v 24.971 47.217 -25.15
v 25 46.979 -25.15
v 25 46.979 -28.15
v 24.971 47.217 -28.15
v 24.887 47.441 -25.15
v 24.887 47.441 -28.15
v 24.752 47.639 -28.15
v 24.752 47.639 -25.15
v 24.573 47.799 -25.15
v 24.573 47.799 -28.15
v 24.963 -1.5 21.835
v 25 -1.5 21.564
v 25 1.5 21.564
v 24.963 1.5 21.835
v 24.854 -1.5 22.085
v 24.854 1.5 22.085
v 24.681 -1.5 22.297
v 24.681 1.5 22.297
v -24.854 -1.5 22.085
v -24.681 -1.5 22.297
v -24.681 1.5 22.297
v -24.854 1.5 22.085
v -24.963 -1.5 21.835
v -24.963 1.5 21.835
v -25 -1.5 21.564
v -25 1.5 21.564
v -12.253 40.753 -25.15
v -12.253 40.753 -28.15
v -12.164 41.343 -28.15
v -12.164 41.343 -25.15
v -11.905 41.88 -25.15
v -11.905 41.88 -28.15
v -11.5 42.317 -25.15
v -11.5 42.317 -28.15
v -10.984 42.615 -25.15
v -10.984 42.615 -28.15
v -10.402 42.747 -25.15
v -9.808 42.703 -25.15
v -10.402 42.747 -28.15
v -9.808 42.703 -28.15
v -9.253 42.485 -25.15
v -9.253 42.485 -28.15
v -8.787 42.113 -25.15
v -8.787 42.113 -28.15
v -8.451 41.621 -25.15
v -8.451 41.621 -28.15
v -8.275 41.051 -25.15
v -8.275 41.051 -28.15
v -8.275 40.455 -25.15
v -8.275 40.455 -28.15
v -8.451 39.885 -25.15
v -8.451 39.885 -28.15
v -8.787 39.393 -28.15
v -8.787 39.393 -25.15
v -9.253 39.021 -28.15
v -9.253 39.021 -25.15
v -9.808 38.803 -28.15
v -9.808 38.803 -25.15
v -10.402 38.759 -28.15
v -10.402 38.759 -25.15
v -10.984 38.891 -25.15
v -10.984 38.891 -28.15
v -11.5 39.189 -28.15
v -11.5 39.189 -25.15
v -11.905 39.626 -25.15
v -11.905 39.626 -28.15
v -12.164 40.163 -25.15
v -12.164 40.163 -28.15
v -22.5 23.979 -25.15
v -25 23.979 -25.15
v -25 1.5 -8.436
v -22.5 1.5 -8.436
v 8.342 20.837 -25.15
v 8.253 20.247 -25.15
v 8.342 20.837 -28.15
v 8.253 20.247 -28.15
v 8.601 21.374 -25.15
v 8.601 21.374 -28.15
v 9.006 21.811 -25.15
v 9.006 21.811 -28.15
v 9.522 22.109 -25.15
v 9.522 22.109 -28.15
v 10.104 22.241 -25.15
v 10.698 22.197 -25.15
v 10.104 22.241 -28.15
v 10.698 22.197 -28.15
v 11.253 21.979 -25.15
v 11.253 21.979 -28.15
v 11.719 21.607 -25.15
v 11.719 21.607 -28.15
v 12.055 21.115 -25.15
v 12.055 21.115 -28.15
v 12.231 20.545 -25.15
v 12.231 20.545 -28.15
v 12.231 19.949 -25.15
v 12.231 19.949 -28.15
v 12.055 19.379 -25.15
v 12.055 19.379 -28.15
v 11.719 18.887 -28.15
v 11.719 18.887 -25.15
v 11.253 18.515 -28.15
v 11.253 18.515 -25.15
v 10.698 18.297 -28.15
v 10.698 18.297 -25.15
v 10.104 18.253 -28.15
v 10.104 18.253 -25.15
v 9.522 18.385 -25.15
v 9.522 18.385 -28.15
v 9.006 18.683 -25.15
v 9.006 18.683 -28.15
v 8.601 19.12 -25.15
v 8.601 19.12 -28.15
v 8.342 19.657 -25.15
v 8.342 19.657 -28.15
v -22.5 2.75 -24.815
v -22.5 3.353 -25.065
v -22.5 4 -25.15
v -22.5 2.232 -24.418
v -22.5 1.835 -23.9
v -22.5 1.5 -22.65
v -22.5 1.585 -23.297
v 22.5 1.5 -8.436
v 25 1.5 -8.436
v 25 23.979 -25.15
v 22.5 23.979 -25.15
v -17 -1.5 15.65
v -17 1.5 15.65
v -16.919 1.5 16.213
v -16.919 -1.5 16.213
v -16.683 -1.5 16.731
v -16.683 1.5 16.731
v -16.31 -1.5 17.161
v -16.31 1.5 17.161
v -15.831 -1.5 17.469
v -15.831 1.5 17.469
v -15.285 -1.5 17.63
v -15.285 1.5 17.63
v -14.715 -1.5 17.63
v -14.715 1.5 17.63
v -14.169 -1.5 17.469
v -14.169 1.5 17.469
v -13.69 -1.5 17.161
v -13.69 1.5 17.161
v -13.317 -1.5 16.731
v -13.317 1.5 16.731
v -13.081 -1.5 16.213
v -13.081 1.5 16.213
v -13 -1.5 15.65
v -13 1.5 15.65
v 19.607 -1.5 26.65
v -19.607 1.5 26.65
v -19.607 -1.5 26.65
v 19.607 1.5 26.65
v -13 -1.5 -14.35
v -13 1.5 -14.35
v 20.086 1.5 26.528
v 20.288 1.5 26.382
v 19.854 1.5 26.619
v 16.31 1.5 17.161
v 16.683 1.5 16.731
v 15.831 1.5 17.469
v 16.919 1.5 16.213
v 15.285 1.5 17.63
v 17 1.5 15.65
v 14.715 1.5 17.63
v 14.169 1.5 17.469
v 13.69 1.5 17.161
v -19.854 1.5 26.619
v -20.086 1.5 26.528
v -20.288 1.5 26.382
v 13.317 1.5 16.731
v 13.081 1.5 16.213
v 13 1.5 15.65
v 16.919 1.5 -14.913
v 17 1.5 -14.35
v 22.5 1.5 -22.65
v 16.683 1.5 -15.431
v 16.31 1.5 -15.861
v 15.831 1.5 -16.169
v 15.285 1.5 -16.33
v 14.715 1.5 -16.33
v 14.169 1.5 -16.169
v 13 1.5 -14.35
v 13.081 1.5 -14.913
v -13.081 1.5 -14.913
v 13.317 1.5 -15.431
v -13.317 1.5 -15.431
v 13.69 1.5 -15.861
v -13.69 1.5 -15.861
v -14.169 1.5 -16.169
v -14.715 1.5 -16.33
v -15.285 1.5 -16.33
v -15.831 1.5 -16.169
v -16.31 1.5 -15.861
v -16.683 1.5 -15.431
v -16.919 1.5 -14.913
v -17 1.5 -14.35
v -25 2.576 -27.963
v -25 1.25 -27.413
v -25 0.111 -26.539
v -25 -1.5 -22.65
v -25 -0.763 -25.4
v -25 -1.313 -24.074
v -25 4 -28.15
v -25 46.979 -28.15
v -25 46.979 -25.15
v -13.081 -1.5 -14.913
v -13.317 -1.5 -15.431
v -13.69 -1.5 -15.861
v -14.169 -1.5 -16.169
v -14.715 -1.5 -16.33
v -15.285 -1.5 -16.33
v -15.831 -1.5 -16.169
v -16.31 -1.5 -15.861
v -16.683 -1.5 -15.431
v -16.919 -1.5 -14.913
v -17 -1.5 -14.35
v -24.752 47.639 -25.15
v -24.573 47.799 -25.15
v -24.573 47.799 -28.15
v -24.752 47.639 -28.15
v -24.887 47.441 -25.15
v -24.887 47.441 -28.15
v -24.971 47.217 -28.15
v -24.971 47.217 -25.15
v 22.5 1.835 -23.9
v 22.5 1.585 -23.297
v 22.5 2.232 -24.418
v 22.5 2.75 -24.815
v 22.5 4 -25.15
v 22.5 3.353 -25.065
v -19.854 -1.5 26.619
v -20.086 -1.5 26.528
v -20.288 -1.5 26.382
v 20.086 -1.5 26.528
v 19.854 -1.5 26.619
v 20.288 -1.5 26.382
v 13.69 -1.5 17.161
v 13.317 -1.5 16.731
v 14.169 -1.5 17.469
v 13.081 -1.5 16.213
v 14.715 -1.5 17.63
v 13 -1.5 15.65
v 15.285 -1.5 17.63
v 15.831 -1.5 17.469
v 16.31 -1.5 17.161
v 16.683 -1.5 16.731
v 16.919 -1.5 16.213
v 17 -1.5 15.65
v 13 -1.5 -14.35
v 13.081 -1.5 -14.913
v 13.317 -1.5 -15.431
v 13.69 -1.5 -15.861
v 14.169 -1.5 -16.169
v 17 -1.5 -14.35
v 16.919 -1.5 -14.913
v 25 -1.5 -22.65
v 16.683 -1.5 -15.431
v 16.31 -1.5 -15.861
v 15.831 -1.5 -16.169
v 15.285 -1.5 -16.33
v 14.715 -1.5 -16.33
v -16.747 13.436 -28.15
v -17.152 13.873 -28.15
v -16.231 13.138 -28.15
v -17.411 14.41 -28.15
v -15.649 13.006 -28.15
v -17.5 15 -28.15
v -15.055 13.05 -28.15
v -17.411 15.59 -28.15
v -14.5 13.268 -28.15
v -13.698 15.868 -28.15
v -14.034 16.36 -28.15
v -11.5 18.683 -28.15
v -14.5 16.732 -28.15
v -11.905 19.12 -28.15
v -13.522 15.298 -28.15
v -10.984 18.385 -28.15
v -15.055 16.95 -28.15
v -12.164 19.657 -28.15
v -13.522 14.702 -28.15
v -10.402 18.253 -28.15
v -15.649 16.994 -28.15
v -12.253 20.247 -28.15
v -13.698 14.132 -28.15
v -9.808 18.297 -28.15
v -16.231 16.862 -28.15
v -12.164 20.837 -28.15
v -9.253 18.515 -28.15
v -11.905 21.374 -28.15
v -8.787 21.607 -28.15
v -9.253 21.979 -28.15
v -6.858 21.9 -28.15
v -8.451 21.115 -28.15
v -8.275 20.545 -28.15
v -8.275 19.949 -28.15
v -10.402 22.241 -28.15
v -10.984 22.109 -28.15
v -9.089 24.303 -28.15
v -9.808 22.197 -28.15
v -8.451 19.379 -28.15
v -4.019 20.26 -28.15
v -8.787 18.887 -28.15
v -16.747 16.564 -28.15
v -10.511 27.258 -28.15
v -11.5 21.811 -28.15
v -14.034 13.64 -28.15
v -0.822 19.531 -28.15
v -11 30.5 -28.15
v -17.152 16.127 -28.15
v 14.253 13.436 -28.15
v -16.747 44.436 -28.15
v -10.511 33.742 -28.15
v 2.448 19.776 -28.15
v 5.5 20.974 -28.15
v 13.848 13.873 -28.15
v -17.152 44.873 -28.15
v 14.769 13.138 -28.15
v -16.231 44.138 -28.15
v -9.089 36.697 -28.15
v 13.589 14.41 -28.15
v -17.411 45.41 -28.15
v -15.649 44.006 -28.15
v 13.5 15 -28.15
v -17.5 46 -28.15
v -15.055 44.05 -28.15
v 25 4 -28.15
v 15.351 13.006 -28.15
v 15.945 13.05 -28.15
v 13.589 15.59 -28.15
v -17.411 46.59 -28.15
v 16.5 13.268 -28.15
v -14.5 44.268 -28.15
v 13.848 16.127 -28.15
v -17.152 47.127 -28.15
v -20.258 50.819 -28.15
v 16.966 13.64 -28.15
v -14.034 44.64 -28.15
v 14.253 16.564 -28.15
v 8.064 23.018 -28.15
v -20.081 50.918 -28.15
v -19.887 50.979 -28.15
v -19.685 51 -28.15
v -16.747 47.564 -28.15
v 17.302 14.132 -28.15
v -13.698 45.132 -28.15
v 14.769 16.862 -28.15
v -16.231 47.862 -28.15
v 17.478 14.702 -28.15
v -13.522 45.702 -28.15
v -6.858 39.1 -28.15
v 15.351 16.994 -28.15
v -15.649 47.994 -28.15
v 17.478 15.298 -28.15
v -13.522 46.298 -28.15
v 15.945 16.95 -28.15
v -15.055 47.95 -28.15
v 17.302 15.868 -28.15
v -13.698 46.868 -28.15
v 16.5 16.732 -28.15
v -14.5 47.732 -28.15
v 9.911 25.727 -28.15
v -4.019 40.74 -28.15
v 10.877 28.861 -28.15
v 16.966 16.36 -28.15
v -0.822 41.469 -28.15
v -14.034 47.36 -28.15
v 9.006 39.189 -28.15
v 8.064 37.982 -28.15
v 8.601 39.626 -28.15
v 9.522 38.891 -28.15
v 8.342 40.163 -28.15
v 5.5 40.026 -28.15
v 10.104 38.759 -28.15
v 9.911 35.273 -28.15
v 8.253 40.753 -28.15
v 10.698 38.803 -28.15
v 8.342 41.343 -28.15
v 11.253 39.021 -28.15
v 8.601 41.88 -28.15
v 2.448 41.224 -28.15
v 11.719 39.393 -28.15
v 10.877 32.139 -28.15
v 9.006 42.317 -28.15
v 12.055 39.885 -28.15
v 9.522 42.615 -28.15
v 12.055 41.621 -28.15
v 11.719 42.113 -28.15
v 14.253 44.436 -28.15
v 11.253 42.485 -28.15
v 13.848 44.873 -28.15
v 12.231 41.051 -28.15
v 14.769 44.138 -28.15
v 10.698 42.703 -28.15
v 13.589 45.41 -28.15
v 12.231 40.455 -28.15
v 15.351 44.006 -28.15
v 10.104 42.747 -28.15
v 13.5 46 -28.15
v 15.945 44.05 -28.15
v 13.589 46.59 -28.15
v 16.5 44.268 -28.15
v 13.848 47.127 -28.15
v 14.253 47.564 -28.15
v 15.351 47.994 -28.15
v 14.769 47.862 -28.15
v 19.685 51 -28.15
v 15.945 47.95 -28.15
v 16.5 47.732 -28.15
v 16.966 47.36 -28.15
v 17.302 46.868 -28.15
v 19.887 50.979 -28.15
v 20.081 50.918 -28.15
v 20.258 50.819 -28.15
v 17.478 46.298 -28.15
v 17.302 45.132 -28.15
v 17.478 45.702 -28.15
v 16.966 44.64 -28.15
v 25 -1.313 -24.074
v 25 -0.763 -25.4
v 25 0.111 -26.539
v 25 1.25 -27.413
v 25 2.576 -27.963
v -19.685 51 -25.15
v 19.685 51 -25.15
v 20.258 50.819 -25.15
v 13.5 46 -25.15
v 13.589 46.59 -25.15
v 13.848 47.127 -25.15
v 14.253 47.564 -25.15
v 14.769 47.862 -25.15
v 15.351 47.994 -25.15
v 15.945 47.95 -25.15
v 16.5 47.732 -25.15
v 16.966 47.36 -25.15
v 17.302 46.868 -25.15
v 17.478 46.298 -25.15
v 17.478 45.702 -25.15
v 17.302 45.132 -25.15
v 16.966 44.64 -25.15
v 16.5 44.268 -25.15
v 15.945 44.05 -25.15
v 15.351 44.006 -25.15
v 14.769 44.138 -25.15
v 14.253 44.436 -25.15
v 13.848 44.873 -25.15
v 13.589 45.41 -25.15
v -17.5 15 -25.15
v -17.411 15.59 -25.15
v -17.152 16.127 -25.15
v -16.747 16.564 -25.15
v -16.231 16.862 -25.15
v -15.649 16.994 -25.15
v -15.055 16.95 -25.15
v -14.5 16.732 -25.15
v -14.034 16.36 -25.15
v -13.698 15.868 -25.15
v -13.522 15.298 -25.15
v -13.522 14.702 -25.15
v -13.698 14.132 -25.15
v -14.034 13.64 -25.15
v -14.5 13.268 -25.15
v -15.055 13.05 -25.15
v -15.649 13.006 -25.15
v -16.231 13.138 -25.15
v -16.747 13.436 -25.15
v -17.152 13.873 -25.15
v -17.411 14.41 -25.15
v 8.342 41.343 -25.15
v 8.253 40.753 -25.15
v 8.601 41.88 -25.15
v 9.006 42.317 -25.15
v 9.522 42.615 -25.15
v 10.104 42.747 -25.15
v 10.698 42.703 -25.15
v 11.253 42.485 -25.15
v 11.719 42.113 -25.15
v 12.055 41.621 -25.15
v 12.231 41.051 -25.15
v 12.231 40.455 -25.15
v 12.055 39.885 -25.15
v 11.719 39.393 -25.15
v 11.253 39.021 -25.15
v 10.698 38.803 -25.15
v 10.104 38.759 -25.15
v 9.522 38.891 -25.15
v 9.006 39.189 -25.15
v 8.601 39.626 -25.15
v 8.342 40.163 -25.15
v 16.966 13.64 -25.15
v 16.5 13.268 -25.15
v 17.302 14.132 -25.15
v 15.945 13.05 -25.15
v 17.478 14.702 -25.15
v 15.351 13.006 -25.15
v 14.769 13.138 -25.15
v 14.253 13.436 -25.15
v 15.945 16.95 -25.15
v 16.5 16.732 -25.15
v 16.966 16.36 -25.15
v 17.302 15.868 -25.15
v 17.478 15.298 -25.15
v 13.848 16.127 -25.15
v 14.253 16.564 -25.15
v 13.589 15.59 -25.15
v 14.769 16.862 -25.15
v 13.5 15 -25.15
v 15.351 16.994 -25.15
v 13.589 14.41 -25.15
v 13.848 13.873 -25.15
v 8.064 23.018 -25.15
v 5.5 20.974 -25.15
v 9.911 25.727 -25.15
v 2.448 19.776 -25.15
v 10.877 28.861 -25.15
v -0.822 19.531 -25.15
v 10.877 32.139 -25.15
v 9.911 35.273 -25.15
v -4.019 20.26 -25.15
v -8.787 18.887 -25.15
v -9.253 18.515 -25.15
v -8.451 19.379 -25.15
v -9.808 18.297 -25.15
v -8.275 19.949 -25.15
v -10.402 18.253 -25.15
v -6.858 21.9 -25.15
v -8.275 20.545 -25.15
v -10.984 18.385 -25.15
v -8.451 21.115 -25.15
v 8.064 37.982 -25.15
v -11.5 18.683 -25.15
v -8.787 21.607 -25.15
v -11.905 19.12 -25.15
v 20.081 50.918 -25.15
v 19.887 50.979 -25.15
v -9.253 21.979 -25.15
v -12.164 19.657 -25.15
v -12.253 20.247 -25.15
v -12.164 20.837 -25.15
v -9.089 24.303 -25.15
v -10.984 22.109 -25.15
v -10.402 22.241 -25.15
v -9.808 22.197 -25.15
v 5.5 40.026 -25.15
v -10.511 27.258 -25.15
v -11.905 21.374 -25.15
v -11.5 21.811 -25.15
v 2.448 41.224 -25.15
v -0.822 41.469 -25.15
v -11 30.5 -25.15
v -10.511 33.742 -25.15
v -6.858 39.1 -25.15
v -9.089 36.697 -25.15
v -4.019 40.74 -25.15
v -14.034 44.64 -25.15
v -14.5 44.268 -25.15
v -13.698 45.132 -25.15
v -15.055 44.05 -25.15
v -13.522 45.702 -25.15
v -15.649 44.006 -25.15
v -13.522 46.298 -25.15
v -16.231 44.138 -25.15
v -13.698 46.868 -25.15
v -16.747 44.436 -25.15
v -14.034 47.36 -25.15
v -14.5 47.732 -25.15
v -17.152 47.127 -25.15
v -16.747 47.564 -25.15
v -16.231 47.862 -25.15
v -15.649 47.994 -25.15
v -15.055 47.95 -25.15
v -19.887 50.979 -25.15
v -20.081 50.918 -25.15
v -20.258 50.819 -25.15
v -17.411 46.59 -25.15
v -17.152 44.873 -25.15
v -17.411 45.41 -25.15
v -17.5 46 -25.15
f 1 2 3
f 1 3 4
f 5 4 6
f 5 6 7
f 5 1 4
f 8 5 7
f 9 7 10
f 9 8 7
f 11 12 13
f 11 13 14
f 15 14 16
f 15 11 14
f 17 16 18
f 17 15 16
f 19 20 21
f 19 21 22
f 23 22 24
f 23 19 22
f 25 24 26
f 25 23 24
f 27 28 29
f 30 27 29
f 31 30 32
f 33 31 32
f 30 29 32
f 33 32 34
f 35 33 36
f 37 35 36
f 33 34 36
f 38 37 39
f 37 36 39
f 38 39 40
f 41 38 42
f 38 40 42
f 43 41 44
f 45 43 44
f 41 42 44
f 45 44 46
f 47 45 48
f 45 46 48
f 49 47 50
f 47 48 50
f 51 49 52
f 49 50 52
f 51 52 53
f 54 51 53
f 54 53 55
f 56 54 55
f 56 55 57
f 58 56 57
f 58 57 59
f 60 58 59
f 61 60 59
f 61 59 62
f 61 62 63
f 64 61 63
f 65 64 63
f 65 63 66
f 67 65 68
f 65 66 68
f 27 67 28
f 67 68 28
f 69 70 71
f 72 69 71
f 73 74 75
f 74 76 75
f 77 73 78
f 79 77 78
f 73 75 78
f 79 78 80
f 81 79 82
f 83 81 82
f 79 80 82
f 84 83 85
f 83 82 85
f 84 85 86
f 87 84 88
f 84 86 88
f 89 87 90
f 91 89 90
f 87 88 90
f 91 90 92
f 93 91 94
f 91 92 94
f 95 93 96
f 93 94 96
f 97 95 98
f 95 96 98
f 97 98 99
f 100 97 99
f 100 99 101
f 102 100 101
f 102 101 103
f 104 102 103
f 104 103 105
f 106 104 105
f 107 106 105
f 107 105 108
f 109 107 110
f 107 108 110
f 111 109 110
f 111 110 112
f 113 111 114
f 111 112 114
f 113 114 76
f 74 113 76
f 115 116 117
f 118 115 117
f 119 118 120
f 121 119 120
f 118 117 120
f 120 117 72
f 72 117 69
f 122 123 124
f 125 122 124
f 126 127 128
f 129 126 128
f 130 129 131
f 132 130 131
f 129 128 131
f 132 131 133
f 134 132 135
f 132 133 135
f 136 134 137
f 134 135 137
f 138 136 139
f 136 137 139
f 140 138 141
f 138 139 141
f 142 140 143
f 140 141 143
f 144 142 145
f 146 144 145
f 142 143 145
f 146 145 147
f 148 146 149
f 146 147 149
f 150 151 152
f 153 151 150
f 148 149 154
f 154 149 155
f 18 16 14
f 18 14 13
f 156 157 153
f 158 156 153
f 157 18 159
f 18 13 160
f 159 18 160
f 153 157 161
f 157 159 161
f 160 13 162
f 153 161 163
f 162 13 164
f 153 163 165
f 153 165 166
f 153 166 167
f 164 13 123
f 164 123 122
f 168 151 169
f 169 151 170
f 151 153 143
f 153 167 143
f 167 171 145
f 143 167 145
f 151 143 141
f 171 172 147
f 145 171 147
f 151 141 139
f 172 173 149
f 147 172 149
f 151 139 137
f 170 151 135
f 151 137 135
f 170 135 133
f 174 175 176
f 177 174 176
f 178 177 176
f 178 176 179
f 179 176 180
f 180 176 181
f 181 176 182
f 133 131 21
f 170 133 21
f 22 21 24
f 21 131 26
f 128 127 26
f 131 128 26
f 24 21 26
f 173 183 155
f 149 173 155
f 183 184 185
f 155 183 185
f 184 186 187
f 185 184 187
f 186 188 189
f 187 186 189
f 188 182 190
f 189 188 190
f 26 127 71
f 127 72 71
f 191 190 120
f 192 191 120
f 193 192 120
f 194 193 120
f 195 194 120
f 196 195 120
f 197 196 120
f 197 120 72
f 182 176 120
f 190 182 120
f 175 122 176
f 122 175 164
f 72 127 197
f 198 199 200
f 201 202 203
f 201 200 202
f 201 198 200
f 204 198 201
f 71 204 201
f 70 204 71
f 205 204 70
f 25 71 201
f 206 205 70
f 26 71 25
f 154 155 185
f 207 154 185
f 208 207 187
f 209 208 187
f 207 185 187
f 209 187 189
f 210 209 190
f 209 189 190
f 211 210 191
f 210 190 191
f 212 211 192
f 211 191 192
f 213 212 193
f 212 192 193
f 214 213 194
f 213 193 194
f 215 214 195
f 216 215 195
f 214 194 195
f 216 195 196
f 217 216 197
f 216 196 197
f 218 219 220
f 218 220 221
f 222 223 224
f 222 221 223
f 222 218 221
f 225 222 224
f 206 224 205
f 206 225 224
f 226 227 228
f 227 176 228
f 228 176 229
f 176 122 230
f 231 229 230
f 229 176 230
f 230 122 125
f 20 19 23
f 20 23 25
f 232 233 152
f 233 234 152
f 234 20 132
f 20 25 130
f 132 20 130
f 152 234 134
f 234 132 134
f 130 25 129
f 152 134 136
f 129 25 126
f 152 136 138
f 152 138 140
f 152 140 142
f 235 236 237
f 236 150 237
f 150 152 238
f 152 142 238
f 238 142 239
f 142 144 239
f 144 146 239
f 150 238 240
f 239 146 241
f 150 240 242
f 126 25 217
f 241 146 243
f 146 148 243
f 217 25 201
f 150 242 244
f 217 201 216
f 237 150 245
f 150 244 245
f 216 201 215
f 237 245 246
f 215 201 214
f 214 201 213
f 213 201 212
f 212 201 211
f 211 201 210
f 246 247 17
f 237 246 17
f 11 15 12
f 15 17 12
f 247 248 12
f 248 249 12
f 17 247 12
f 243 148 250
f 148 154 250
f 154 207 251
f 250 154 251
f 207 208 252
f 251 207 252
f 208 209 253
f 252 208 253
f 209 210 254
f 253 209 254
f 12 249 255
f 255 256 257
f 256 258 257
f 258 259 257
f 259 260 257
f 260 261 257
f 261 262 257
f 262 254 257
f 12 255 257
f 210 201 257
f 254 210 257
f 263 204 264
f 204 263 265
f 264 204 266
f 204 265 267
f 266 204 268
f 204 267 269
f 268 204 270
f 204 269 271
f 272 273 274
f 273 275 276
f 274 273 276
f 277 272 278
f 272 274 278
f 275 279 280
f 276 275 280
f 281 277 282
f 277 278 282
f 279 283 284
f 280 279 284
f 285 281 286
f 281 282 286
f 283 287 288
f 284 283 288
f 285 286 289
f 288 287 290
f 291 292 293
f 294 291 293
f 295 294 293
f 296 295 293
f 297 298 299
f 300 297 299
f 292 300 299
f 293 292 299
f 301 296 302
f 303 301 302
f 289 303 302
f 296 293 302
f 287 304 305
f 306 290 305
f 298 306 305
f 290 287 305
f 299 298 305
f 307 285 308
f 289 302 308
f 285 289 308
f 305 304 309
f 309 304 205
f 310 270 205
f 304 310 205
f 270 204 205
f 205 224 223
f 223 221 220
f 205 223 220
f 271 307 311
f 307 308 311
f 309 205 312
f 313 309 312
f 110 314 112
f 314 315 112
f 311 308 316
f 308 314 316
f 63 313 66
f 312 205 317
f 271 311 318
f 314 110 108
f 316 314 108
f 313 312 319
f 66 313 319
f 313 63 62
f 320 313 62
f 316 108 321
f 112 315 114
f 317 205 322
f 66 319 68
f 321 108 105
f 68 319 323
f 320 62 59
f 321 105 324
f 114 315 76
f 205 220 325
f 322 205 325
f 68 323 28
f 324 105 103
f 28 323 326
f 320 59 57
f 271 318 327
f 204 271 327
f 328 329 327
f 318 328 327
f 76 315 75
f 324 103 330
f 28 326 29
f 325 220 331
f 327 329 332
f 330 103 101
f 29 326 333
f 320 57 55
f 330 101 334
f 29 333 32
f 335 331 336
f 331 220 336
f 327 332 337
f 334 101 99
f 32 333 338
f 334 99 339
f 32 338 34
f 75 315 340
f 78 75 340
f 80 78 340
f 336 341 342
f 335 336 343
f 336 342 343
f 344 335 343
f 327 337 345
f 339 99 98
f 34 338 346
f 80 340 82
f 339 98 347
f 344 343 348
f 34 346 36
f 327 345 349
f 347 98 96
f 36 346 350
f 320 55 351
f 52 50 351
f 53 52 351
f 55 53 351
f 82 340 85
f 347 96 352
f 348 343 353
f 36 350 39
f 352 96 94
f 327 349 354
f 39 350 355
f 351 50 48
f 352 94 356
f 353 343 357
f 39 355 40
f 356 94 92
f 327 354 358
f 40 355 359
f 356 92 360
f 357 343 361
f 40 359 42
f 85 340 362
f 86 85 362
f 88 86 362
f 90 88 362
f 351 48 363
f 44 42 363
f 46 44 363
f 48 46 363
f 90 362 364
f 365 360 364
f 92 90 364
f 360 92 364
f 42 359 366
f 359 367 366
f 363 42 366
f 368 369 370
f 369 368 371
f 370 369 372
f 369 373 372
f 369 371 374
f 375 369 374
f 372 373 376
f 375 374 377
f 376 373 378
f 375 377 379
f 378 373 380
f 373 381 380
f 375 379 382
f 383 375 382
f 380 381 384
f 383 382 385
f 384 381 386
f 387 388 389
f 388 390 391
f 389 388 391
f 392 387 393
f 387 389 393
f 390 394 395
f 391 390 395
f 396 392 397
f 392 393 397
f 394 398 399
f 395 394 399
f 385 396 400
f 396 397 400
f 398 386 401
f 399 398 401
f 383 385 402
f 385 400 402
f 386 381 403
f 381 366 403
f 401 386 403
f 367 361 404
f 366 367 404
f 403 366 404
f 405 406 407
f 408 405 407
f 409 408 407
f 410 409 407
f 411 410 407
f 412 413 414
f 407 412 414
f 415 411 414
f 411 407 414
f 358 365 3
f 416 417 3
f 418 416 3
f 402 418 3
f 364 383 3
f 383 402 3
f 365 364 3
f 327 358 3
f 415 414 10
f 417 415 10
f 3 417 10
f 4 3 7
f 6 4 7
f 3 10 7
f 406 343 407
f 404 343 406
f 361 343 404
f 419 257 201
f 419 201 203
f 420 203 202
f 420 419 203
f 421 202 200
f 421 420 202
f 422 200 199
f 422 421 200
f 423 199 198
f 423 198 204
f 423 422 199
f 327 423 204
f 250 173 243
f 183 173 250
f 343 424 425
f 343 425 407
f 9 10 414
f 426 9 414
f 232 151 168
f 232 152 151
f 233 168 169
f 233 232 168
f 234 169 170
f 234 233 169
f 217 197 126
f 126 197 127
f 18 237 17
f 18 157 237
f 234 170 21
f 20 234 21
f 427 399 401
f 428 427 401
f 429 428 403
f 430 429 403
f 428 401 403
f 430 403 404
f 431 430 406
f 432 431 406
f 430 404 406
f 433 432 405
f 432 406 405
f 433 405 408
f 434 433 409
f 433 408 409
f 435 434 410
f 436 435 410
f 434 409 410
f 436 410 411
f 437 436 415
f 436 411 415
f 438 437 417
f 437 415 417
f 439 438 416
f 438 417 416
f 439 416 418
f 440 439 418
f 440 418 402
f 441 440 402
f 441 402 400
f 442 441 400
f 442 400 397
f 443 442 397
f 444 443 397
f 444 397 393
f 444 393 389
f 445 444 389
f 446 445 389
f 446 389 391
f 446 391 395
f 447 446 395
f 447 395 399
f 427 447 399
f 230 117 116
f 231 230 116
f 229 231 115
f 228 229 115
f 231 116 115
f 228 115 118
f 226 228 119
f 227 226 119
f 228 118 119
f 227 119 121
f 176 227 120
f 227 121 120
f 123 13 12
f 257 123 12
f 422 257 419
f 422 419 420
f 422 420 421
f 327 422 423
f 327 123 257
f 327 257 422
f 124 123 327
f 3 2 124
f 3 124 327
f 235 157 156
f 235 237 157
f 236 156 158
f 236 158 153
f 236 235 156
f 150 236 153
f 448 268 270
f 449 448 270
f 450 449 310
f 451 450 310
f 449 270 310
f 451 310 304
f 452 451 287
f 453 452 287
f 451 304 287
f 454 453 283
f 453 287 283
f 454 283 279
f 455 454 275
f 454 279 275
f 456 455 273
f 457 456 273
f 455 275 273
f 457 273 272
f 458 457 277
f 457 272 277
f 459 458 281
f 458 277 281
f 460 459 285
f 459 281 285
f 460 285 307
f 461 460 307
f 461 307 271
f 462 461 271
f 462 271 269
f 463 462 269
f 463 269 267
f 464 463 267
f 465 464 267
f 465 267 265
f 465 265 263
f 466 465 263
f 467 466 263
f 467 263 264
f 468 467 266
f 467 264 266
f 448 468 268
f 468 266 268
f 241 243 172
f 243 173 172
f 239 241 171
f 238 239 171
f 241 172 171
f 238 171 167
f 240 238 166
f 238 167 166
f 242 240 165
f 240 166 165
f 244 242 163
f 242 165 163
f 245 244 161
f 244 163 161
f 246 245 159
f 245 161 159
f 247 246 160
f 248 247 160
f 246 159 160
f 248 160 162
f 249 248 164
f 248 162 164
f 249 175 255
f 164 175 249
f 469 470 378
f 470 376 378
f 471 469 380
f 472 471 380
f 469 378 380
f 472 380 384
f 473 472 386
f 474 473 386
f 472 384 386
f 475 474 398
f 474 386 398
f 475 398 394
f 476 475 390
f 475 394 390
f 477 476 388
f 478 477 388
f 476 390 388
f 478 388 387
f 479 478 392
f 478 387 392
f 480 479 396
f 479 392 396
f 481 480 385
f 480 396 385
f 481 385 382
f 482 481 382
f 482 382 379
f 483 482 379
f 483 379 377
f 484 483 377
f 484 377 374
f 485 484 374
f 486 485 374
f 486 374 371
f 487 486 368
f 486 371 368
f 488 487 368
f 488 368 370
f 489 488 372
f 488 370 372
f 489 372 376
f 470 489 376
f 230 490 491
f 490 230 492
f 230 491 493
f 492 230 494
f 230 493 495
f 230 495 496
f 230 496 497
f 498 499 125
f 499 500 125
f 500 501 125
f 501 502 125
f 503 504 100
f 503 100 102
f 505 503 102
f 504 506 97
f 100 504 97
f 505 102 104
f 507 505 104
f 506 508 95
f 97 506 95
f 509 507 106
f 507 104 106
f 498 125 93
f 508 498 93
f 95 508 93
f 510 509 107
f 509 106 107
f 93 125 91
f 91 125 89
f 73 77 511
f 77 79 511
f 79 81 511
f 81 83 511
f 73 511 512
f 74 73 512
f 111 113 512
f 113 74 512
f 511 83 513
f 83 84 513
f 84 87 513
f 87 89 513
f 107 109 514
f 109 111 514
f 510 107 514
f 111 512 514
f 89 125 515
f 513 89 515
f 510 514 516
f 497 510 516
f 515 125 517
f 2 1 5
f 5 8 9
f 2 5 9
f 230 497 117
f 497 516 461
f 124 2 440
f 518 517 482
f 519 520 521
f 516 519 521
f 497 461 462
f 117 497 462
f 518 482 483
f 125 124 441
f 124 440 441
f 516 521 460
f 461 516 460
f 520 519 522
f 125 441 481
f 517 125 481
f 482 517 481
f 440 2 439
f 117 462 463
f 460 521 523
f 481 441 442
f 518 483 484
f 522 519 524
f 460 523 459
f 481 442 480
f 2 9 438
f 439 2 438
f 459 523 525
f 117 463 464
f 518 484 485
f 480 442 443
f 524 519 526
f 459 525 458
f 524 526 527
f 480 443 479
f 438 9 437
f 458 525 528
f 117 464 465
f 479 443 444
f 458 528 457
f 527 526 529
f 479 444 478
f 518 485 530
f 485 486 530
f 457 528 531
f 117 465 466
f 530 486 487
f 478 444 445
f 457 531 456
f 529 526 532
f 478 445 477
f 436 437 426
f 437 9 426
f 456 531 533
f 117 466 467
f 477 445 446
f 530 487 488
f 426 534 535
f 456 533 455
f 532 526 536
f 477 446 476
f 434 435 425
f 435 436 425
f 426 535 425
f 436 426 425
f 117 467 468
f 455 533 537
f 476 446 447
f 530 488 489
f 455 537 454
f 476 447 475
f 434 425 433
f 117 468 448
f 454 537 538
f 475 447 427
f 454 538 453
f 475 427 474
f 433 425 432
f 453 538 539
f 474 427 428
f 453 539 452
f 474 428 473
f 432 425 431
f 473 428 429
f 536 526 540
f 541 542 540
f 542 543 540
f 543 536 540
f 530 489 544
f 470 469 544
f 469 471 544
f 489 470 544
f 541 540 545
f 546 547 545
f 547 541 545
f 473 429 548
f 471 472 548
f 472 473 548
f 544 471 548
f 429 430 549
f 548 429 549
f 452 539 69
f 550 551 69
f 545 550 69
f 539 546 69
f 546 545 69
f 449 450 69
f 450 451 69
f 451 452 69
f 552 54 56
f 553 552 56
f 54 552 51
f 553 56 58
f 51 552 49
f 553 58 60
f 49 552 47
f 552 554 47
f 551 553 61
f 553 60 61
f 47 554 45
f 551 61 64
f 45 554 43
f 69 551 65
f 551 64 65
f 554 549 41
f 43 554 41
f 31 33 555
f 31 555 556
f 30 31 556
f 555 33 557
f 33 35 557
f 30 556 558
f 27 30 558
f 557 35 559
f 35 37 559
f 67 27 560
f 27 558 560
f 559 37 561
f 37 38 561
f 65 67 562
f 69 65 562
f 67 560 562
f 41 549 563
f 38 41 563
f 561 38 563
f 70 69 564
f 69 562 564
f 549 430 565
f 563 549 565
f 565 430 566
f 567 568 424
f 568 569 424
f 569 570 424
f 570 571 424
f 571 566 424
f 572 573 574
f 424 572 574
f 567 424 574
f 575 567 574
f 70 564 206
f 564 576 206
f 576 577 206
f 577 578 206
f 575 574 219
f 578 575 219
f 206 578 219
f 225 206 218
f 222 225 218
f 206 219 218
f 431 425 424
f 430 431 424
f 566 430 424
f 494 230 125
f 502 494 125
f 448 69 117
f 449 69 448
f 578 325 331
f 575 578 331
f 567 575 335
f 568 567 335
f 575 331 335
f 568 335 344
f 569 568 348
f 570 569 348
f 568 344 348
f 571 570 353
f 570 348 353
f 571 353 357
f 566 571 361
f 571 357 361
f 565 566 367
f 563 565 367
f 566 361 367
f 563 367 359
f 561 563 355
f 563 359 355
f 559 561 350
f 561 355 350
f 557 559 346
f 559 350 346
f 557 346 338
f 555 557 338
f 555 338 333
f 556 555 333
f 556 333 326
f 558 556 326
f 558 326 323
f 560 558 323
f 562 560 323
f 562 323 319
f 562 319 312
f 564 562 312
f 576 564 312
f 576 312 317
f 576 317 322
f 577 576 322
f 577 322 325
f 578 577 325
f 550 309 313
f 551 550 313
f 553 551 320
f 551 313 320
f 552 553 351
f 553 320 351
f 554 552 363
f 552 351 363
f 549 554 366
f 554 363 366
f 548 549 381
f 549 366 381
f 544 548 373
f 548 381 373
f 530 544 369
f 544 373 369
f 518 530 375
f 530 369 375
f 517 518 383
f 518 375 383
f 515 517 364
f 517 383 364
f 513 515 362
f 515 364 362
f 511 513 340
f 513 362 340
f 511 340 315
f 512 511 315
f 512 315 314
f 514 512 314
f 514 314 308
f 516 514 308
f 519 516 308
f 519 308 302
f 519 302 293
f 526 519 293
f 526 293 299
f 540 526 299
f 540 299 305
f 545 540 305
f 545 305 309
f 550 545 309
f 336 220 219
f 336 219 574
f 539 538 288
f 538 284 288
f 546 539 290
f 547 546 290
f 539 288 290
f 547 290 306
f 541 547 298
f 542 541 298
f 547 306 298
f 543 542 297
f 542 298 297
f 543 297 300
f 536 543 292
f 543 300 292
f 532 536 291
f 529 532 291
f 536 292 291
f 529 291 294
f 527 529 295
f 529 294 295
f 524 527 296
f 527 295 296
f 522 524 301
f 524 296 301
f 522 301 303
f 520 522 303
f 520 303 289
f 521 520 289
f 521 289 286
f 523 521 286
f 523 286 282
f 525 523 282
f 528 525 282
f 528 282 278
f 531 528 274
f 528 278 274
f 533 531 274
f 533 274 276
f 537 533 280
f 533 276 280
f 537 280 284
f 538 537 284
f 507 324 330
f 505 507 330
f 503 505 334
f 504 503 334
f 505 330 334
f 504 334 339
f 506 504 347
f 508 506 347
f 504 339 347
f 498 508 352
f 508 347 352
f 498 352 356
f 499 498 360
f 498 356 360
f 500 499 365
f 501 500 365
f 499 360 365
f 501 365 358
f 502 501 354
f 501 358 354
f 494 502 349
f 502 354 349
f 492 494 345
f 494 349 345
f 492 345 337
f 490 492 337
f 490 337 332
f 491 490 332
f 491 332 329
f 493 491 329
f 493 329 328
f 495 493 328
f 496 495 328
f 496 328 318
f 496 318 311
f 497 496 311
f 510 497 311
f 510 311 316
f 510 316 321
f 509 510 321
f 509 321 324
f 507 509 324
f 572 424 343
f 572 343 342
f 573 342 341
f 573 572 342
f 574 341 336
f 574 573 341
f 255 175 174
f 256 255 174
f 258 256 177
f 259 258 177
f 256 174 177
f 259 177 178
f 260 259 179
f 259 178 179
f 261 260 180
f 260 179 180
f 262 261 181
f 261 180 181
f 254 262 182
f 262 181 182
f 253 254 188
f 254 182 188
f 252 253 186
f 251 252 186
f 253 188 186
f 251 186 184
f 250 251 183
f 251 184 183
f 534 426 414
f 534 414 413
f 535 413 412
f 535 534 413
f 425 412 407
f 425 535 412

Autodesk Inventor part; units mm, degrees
ref_plane "YZ Plane" through (0, 0, 0) normal (1, 0, 0) x (0, 1, 0)
ref_plane "XZ Plane" through (0, 0, 0) normal (0, 1, 0) x (-1, 0, 0)
sketch "Sketch1" plane through (0, 0, 0) normal (1, 0, 0) x (0, 1, 0)
  line L0 (0, 0) -> (0, -22.65)
  line L1 (0, 0) -> (0, 26.65)
  line L2 (4, -26.65) -> (51, -26.65)
  arc A0 (0, -22.65) -> (4, -26.65) centre (4, -22.65) ccw
  point P0 (0, -26.65)
  dimension "d0" = 26.65
  dimension "d1" = 26.65
  dimension "d2" = 51
  dimension "d3" = 4
ref_plane "Work Plane1" through (0, 0, 26.65) normal (0, 0, 1) x (1, 0, 0)
sketch "Sketch2" plane through (0, 0, 26.65) normal (0, 0, 1) x (1, 0, 0)
  line L0 (-25, 1.5) -> (25, 1.5)
  line L1 (25, 1.5) -> (25, -1.5)
  line L2 (25, -1.5) -> (-25, -1.5)
  line L3 (-25, -1.5) -> (-25, 1.5)
  line L4 (-25, 1.5) -> (25, -1.5) construction
  line L5 (25, 1.5) -> (-25, -1.5) construction
  point P0 (0, 0)
  dimension "d4" = 50
  dimension "d5" = 3
sweep "Sweep1" add profiles "Sketch2" path "Sketch1"
sketch "Sketch3" plane through (25, 4, -28.15) normal (0, 0, -1) x (-1, 0, 0)
  line L0 (0, 47) -> (50, 47) construction
  line L1 (50, 0) -> (50, 47) construction
  circle A0 centre (25, 26.5) radius 11
  point P0 (25, -4)
  dimension "d8" = 22
  dimension "d9" = 20.5
  dimension "d10" = 25
extrude "Extrusion1" cut sketch "Sketch3" against normal blind 10
sketch "Sketch4" plane through (25, 4, -28.15) normal (0, 0, -1) x (-1, 0, 0)
  circle A0 centre (25, 26.5) radius 11 construction
  line L0 (50, 0) -> (50, 47) construction
  line L1 (0, 0) -> (0, 47) construction
  line L2 (0, 47) -> (50, 47) construction
  line L3 (0, 0) -> (50, 0) construction
  circle A1 centre (40.5, 42) radius 2
  line L4 (25, 26.5) -> (14, 26.5) construction
  circle A2 centre (25, 26.5) radius 11 construction
  line L5 (25, 26.5) -> (25, 15.5) construction
  circle A3 centre (9.5, 42) radius 2
  circle A4 centre (40.5, 11) radius 2
  circle A5 centre (9.5, 11) radius 2
  line L6 (25, 26.5) -> (40.5, 42) construction
  circle A6 centre (35.253, 36.753) radius 2
  circle A7 centre (14.747, 36.753) radius 2
  circle A8 centre (35.253, 16.247) radius 2
  circle A9 centre (14.747, 16.247) radius 2
  point P0 (25, -4)
  point P1 (33.8388, 35.3388)
  point P2 (32.7782, 34.2782)
  dimension "d17" = 4
  dimension "d13" = 4
  dimension "d14" = 15.5
  dimension "d15" = 15.5
  dimension "d18" = 1.5
extrude "Extrusion2" cut sketch "Sketch4" against normal blind 10
sketch "Sketch5" plane through (25, 4, -28.15) normal (0, 0, -1) x (-1, 0, 0)
  line L0 (0, 47) -> (50, 47) construction
  line L1 (50, 0) -> (50, 47) construction
  line L2 (0, 0) -> (0, 47) construction
  line L3 (0, 43.5) -> (5, 47)
  line L4 (25, 47) -> (25, 37.5) construction
  circle A0 centre (25, 26.5) radius 11 construction
  line L5 (50, 43.5) -> (45, 47)
  line L6 (0, 43.5) -> (0, 47)
  line L7 (0, 47) -> (5, 47)
  line L8 (45, 47) -> (50, 47)
  line L9 (50, 47) -> (50, 43.5)
  line L10 (50, 0) -> (50, 47) projected
  point P0 (25, -4)
  point P1 (0, 23.5)
  dimension "d21" = 20
  dimension "d22" = 20
extrude "Extrusion3" cut sketch "Sketch5" against normal blind 10
sketch "Sketch6" plane through (-25, 1.5, 26.65) normal (0, 1, 0) x (1, 0, 0)
  line L0 (0, 0) -> (0, 49.3) construction
  line L1 (0, 0) -> (50, 0) construction
  line L2 (50, 0) -> (50, 49.3) construction
  line L3 (45, 0) -> (50, 4.65)
  line L4 (25, 0) -> (25, 26.65) construction
  line L5 (5, 0) -> (0, 4.65)
  line L6 (5, 0) -> (0, 0)
  line L7 (0, 4.65) -> (0, 0)
  line L8 (45, 0) -> (50, 0)
  line L9 (50, 4.65) -> (50, 0)
  point P0 (50, 24.65)
  dimension "d25" = 20
  dimension "d26" = 20
extrude "Extrusion4" cut sketch "Sketch6" against normal blind 10
sketch "Sketch7" plane through (-25, 1.5, -22.65) normal (0, 1, 0) x (1, 0, 0)
  line L0 (10, -40.3) -> (10, -6.3) construction
  line L1 (12, -38.3) -> (12, -8.3)
  line L2 (8, -8.3) -> (8, -38.3)
  arc A0 (8, -38.3) -> (12, -38.3) centre (10, -38.3) ccw
  arc A1 (12, -8.3) -> (8, -8.3) centre (10, -8.3) ccw
  line L3 (11.5, 2.5) -> (7.5, 2.5) construction
  line L4 (0, -44.65) -> (0, 0) construction
  line L5 (45, -49.3) -> (5, -49.3) construction
  line L6 (25, -49.3) -> (25, -22.65) construction
  line L7 (38, -38.3) -> (38, -8.3)
  line L8 (42, -8.3) -> (42, -38.3)
  arc A2 (38, -38.3) -> (42, -38.3) centre (40, -38.3) ccw
  arc A3 (42, -8.3) -> (38, -8.3) centre (40, -8.3) ccw
  point P0 (10, -23.3)
  dimension "d29" = 34
  dimension "d30" = 4
  dimension "d31" = 8
  dimension "d32" = 9
extrude "Extrusion5" cut sketch "Sketch7" against normal blind 10
fillet "Fillet1" radius 1 8 edges at (20, 51, -26.65) (-20, 51, -26.65) (-25, 47.5, -26.65) (25, 47.5, -26.65) (25, 0, 22) (20, 0, 26.65) (-20, 0, 26.65) (-25, 0, 22)
sketch "Sketch8" plane through (-25, 4, -25.15) normal (-1, 0, 0) x (0, 0, 1)
  line L0 (0, 0) -> (0, 42.9793) projected
  arc A0 (0, 0) -> (2.5, -2.5) centre (2.5, 0) ccw projected
  line L1 (46.7144, -2.5) -> (2.5, -2.5) projected
  line L2 (10.8, -2.5) -> (40.8, -2.5) projected
  line L3 (0, 19.9793) -> (16.7144, -2.5)
  point P0 (25.15, -4)
  dimension "d36" = 30
  dimension "d37" = 23
extrude "Extrusion6" add sketch "Sketch8" against normal blind 2.5
mirror "Mirror1" about plane through (0, 0, 0) normal (1, 0, 0) of "Extrusion6"
properties part number "Stepper Bracket"
